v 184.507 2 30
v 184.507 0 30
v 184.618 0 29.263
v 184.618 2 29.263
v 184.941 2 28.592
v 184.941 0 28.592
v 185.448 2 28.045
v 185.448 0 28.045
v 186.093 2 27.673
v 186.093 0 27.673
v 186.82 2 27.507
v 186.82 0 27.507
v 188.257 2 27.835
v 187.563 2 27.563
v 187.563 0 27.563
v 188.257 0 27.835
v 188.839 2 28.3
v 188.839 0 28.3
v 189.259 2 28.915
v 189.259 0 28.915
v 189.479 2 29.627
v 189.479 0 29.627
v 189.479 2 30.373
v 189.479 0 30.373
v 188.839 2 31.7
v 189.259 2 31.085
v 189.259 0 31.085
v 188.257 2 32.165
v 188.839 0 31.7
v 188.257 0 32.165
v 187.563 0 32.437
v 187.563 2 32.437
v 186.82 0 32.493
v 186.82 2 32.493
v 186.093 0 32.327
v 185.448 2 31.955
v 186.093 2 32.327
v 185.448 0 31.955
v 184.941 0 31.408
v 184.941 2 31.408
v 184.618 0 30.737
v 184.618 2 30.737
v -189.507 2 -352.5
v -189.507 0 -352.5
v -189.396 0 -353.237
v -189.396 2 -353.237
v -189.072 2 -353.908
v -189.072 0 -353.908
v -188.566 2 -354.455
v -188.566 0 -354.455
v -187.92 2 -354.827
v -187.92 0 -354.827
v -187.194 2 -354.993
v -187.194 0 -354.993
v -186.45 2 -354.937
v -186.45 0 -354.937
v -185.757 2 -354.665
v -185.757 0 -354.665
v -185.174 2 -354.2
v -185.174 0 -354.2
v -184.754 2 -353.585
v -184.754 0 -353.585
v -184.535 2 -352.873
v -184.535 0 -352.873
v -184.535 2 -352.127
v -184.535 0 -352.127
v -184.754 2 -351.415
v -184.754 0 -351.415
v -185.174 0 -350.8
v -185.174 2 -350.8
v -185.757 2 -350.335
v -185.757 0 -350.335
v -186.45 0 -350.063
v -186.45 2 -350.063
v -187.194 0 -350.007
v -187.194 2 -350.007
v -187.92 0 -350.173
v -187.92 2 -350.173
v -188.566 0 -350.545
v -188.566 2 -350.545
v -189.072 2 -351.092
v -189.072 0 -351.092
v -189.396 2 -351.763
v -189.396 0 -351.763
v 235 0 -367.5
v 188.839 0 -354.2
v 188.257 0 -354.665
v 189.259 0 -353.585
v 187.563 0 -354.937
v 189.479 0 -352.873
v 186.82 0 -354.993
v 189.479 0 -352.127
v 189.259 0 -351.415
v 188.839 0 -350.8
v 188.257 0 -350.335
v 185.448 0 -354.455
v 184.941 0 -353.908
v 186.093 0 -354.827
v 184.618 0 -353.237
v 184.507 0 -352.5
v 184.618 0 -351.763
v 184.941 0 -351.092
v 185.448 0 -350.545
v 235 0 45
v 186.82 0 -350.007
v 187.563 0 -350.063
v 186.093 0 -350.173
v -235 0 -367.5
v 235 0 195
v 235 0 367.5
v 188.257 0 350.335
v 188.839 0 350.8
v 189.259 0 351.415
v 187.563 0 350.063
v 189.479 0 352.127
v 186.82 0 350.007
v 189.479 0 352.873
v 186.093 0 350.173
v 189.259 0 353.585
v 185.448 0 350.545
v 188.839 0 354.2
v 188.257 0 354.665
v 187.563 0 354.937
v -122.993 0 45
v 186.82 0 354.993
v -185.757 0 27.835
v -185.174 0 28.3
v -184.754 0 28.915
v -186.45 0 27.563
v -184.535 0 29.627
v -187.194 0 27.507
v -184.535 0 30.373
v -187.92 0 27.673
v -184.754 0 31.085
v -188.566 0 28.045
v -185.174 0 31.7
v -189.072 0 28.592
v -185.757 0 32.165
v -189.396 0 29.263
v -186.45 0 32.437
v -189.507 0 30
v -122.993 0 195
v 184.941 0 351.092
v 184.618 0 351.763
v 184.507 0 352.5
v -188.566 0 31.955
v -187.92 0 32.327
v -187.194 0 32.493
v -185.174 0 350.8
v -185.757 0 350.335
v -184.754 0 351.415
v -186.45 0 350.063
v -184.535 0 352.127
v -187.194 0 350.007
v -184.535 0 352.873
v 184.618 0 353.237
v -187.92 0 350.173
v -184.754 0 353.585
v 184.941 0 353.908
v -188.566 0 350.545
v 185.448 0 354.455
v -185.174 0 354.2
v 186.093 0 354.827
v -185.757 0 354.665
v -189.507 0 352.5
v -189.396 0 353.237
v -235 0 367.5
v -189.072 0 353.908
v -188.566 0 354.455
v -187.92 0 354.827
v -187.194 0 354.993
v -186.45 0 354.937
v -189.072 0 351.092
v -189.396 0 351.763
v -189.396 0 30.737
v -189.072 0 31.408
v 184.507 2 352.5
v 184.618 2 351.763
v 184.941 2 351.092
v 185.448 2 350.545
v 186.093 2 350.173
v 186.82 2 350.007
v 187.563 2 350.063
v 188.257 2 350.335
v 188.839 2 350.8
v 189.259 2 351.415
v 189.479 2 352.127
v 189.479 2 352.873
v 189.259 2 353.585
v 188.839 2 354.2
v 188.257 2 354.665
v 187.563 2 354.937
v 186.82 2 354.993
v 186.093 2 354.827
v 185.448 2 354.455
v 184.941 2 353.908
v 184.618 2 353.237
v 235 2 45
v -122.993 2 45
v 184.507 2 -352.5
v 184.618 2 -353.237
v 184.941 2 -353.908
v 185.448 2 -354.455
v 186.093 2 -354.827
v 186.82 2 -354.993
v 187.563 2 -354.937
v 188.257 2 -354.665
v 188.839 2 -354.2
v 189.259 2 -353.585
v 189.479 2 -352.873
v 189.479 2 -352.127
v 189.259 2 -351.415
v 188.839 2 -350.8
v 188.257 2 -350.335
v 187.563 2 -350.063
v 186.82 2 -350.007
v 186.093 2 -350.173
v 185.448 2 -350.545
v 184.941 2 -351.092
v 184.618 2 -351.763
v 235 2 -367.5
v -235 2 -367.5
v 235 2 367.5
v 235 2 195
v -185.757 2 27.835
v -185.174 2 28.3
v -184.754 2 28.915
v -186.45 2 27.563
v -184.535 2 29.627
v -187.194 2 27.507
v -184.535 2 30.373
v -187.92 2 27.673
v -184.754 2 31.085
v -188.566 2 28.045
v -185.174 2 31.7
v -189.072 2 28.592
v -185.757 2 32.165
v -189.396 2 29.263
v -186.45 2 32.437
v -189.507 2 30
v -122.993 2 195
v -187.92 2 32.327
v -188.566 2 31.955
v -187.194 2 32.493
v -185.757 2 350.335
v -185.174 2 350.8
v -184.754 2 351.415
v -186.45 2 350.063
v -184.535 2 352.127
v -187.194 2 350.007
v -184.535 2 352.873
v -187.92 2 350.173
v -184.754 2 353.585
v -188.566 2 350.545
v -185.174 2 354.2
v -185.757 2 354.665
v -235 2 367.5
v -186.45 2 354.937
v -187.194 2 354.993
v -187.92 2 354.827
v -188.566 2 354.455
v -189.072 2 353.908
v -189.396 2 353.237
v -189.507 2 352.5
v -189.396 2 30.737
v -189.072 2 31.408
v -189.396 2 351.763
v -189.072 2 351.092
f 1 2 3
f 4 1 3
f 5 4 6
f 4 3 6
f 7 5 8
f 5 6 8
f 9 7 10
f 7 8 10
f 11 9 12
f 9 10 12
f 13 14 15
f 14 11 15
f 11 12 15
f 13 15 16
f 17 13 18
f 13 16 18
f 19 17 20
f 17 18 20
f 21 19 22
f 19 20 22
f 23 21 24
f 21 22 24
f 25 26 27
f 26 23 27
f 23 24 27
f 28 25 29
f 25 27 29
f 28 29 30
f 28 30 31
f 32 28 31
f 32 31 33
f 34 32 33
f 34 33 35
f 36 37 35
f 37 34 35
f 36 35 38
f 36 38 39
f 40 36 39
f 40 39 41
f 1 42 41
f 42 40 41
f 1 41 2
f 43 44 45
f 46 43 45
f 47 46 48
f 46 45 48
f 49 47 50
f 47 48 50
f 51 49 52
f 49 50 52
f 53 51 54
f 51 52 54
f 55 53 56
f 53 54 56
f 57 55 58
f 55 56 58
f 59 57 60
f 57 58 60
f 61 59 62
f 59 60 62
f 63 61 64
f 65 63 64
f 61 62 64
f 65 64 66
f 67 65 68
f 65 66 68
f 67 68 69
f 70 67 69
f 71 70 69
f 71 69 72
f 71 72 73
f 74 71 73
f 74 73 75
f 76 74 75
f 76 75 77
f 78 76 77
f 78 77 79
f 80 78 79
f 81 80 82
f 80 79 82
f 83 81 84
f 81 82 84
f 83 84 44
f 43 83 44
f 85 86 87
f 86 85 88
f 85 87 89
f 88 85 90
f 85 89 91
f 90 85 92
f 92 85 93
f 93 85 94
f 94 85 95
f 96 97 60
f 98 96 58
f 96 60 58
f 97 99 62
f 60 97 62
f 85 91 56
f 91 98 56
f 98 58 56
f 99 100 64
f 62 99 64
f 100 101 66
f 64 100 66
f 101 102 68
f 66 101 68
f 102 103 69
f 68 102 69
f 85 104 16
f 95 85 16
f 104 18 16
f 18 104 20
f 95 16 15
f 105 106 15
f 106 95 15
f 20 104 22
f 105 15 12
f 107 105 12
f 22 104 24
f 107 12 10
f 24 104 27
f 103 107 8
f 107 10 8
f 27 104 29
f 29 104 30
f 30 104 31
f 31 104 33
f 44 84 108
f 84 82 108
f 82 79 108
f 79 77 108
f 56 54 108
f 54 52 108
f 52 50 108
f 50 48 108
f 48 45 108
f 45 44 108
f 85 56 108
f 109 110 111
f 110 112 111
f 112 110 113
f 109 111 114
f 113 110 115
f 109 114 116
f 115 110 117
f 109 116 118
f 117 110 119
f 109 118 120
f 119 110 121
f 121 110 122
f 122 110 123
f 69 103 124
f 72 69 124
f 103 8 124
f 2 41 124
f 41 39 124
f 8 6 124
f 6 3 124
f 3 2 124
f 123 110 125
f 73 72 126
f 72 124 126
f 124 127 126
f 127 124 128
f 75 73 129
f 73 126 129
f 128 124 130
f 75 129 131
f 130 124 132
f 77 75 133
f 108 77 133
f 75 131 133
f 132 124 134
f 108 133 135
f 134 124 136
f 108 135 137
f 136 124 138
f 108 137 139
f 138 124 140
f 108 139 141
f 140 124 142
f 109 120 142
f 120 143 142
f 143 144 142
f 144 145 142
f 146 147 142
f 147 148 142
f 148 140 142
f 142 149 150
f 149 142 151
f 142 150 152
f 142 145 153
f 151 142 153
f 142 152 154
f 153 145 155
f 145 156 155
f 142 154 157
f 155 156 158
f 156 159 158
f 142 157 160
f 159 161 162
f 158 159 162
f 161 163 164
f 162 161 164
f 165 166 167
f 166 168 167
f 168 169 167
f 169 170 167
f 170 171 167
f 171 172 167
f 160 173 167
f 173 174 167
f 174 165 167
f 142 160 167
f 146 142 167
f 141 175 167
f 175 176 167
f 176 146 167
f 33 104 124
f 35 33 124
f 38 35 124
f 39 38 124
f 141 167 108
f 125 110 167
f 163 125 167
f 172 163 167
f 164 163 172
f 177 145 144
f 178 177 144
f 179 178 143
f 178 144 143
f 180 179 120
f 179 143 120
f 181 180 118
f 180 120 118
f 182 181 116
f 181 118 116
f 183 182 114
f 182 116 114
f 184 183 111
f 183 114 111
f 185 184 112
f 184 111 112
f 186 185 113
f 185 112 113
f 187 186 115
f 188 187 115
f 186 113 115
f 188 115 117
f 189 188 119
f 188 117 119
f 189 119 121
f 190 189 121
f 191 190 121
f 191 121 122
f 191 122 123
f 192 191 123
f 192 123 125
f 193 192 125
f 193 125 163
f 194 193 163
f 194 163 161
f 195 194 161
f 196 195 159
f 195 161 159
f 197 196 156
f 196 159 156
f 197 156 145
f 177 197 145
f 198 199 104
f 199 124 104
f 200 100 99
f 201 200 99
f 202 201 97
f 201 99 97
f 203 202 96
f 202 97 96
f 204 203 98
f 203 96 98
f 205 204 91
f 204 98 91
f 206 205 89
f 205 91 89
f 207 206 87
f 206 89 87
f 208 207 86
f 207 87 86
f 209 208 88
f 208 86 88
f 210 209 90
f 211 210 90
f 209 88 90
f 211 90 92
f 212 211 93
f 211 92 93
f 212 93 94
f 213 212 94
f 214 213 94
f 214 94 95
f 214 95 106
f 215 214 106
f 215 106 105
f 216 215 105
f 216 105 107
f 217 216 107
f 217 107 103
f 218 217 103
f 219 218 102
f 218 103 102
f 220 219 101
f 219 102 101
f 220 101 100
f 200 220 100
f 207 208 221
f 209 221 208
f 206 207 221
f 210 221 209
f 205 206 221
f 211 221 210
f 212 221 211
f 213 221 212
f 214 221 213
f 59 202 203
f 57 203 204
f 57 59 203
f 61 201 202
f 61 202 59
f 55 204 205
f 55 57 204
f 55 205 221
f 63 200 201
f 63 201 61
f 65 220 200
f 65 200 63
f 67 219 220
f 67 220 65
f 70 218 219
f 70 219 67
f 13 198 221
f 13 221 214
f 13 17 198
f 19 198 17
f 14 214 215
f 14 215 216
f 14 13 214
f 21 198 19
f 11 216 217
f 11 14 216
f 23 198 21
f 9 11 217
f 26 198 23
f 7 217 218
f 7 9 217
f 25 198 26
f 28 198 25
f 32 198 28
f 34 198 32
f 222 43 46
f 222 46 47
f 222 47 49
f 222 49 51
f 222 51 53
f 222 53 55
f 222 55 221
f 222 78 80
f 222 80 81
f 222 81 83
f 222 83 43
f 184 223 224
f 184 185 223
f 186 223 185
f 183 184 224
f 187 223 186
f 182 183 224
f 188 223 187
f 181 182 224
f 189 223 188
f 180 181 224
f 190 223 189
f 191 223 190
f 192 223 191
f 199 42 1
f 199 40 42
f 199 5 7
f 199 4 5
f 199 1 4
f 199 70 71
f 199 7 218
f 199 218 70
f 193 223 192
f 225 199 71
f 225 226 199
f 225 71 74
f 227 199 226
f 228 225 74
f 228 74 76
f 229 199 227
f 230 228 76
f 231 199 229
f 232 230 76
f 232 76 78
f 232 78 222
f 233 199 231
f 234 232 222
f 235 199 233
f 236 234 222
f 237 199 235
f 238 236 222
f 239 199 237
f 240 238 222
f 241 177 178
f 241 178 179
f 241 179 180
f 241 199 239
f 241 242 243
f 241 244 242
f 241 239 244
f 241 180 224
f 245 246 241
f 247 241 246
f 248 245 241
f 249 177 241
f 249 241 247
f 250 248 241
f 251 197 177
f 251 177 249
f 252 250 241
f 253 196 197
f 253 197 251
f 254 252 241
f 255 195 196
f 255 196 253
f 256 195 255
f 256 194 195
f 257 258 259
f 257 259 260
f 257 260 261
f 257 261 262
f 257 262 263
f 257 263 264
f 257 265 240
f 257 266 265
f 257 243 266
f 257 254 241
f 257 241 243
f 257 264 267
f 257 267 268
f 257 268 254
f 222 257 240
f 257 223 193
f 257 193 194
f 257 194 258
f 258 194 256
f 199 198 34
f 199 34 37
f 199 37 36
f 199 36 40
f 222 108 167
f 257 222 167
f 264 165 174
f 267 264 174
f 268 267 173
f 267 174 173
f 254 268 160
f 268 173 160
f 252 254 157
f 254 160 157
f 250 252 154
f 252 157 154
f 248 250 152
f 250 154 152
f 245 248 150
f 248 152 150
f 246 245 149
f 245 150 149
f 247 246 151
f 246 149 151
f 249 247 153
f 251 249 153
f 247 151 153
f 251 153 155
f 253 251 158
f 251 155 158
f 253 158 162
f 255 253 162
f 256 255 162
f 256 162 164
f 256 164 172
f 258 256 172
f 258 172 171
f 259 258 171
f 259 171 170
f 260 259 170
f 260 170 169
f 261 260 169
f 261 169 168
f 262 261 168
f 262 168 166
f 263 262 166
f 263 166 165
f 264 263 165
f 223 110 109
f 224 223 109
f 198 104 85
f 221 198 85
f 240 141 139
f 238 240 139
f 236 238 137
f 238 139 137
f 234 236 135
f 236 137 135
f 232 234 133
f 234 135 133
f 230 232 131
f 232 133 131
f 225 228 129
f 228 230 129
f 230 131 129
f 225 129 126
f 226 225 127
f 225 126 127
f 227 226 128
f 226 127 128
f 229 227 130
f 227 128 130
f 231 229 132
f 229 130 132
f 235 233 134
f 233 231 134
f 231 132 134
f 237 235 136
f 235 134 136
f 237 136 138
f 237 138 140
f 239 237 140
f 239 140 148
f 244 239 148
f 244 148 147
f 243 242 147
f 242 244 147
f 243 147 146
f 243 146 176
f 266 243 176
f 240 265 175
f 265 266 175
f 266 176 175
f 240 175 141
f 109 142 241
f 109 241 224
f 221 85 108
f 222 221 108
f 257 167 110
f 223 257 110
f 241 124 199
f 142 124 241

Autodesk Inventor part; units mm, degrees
ref_plane "YZ Plane" through (0, 0, 0) normal (1, 0, 0) x (0, 1, 0)
ref_plane "XZ Plane" through (0, 0, 0) normal (0, 1, 0) x (-1, 0, 0)
ref_plane "XY Plane" through (0, 0, 0) normal (0, 0, 1) x (1, 0, 0)
sketch "Esquisse1" plane through (0, 0, 0) normal (0, 1, 0) x (-1, 0, 0)
  line L0 (235, 367.5) -> (-235, 367.5)
  line L1 (-235, 367.5) -> (-235, -367.5)
  line L2 (-235, -367.5) -> (235, -367.5)
  line L3 (235, -367.5) -> (235, 367.5)
  line L4 (235, 367.5) -> (-235, -367.5) construction
  line L5 (-235, 367.5) -> (235, -367.5) construction
  line L6 (227.0068, 355) -> (-227.0068, 355)
  line L7 (-227.0068, -355) -> (227.0068, -355)
  line L8 (227.0068, -355) -> (227.0068, 355)
  line L9 (227.0068, 355) -> (-227.0068, -355) construction
  line L10 (-227.0068, 355) -> (227.0068, -355) construction
  line L11 (122.9932, 195) -> (-227.0068, 195)
  line L12 (-227.0068, 195) -> (-227.0068, 45)
  line L13 (-227.0068, 45) -> (122.9932, 45)
  line L14 (122.9932, 45) -> (122.9932, 195)
  line L15 (122.9932, 195) -> (-227.0068, 45) construction
  line L16 (-227.0068, 195) -> (122.9932, 45) construction
  circle A0 centre (-187.0068, -352.5) radius 2.5
  circle A1 centre (187.0068, -352.5) radius 2.5
  circle A2 centre (187.0068, 30) radius 2.5
  circle A3 centre (-187.0068, 30) radius 2.5
  circle A4 centre (-187.0068, 352.5) radius 2.5
  circle A5 centre (187.0068, 352.5) radius 2.5
  line L17 (-227.0068, -355) -> (-197.0068, -355)
  line L18 (-227.0068, -325) -> (-227.0068, -355)
  line L19 (-227.0068, 45) -> (-235, 45)
  line L20 (-227.0068, 195) -> (-235, 195)
  line L21 (-227.0068, 355) -> (-227.0068, 195)
  line L22 (-227.0068, 45) -> (-227.0068, -355)
  point P0 (0, 0)
  point P1 (-52.0068, 120)
  dimension "d0" = 735
  dimension "d1" = 470
  dimension "d2" = 12.5
  dimension "d3" = 160
  dimension "d4" = 150
  dimension "d5" = 350
  dimension "d6" = 5
  dimension "d7" = 5
  dimension "d8" = 5
  dimension "d9" = 5
  dimension "d10" = 5
  dimension "d11" = 5
  dimension "d16" = 40
  dimension "d17" = 40
  dimension "d21" = 40
  dimension "d22" = 397.5
  dimension "d23" = 397.5
extrude "Extrusion1" add sketch "Esquisse1" along normal blind 2 contours L3 L2 L1 L19 L22 L18 L7 L8 L6 L21 L20 L0 | L21 L6 L8 L7 L18 L22 L13 L14 L11
properties part number "PlaqueSupperieur"
